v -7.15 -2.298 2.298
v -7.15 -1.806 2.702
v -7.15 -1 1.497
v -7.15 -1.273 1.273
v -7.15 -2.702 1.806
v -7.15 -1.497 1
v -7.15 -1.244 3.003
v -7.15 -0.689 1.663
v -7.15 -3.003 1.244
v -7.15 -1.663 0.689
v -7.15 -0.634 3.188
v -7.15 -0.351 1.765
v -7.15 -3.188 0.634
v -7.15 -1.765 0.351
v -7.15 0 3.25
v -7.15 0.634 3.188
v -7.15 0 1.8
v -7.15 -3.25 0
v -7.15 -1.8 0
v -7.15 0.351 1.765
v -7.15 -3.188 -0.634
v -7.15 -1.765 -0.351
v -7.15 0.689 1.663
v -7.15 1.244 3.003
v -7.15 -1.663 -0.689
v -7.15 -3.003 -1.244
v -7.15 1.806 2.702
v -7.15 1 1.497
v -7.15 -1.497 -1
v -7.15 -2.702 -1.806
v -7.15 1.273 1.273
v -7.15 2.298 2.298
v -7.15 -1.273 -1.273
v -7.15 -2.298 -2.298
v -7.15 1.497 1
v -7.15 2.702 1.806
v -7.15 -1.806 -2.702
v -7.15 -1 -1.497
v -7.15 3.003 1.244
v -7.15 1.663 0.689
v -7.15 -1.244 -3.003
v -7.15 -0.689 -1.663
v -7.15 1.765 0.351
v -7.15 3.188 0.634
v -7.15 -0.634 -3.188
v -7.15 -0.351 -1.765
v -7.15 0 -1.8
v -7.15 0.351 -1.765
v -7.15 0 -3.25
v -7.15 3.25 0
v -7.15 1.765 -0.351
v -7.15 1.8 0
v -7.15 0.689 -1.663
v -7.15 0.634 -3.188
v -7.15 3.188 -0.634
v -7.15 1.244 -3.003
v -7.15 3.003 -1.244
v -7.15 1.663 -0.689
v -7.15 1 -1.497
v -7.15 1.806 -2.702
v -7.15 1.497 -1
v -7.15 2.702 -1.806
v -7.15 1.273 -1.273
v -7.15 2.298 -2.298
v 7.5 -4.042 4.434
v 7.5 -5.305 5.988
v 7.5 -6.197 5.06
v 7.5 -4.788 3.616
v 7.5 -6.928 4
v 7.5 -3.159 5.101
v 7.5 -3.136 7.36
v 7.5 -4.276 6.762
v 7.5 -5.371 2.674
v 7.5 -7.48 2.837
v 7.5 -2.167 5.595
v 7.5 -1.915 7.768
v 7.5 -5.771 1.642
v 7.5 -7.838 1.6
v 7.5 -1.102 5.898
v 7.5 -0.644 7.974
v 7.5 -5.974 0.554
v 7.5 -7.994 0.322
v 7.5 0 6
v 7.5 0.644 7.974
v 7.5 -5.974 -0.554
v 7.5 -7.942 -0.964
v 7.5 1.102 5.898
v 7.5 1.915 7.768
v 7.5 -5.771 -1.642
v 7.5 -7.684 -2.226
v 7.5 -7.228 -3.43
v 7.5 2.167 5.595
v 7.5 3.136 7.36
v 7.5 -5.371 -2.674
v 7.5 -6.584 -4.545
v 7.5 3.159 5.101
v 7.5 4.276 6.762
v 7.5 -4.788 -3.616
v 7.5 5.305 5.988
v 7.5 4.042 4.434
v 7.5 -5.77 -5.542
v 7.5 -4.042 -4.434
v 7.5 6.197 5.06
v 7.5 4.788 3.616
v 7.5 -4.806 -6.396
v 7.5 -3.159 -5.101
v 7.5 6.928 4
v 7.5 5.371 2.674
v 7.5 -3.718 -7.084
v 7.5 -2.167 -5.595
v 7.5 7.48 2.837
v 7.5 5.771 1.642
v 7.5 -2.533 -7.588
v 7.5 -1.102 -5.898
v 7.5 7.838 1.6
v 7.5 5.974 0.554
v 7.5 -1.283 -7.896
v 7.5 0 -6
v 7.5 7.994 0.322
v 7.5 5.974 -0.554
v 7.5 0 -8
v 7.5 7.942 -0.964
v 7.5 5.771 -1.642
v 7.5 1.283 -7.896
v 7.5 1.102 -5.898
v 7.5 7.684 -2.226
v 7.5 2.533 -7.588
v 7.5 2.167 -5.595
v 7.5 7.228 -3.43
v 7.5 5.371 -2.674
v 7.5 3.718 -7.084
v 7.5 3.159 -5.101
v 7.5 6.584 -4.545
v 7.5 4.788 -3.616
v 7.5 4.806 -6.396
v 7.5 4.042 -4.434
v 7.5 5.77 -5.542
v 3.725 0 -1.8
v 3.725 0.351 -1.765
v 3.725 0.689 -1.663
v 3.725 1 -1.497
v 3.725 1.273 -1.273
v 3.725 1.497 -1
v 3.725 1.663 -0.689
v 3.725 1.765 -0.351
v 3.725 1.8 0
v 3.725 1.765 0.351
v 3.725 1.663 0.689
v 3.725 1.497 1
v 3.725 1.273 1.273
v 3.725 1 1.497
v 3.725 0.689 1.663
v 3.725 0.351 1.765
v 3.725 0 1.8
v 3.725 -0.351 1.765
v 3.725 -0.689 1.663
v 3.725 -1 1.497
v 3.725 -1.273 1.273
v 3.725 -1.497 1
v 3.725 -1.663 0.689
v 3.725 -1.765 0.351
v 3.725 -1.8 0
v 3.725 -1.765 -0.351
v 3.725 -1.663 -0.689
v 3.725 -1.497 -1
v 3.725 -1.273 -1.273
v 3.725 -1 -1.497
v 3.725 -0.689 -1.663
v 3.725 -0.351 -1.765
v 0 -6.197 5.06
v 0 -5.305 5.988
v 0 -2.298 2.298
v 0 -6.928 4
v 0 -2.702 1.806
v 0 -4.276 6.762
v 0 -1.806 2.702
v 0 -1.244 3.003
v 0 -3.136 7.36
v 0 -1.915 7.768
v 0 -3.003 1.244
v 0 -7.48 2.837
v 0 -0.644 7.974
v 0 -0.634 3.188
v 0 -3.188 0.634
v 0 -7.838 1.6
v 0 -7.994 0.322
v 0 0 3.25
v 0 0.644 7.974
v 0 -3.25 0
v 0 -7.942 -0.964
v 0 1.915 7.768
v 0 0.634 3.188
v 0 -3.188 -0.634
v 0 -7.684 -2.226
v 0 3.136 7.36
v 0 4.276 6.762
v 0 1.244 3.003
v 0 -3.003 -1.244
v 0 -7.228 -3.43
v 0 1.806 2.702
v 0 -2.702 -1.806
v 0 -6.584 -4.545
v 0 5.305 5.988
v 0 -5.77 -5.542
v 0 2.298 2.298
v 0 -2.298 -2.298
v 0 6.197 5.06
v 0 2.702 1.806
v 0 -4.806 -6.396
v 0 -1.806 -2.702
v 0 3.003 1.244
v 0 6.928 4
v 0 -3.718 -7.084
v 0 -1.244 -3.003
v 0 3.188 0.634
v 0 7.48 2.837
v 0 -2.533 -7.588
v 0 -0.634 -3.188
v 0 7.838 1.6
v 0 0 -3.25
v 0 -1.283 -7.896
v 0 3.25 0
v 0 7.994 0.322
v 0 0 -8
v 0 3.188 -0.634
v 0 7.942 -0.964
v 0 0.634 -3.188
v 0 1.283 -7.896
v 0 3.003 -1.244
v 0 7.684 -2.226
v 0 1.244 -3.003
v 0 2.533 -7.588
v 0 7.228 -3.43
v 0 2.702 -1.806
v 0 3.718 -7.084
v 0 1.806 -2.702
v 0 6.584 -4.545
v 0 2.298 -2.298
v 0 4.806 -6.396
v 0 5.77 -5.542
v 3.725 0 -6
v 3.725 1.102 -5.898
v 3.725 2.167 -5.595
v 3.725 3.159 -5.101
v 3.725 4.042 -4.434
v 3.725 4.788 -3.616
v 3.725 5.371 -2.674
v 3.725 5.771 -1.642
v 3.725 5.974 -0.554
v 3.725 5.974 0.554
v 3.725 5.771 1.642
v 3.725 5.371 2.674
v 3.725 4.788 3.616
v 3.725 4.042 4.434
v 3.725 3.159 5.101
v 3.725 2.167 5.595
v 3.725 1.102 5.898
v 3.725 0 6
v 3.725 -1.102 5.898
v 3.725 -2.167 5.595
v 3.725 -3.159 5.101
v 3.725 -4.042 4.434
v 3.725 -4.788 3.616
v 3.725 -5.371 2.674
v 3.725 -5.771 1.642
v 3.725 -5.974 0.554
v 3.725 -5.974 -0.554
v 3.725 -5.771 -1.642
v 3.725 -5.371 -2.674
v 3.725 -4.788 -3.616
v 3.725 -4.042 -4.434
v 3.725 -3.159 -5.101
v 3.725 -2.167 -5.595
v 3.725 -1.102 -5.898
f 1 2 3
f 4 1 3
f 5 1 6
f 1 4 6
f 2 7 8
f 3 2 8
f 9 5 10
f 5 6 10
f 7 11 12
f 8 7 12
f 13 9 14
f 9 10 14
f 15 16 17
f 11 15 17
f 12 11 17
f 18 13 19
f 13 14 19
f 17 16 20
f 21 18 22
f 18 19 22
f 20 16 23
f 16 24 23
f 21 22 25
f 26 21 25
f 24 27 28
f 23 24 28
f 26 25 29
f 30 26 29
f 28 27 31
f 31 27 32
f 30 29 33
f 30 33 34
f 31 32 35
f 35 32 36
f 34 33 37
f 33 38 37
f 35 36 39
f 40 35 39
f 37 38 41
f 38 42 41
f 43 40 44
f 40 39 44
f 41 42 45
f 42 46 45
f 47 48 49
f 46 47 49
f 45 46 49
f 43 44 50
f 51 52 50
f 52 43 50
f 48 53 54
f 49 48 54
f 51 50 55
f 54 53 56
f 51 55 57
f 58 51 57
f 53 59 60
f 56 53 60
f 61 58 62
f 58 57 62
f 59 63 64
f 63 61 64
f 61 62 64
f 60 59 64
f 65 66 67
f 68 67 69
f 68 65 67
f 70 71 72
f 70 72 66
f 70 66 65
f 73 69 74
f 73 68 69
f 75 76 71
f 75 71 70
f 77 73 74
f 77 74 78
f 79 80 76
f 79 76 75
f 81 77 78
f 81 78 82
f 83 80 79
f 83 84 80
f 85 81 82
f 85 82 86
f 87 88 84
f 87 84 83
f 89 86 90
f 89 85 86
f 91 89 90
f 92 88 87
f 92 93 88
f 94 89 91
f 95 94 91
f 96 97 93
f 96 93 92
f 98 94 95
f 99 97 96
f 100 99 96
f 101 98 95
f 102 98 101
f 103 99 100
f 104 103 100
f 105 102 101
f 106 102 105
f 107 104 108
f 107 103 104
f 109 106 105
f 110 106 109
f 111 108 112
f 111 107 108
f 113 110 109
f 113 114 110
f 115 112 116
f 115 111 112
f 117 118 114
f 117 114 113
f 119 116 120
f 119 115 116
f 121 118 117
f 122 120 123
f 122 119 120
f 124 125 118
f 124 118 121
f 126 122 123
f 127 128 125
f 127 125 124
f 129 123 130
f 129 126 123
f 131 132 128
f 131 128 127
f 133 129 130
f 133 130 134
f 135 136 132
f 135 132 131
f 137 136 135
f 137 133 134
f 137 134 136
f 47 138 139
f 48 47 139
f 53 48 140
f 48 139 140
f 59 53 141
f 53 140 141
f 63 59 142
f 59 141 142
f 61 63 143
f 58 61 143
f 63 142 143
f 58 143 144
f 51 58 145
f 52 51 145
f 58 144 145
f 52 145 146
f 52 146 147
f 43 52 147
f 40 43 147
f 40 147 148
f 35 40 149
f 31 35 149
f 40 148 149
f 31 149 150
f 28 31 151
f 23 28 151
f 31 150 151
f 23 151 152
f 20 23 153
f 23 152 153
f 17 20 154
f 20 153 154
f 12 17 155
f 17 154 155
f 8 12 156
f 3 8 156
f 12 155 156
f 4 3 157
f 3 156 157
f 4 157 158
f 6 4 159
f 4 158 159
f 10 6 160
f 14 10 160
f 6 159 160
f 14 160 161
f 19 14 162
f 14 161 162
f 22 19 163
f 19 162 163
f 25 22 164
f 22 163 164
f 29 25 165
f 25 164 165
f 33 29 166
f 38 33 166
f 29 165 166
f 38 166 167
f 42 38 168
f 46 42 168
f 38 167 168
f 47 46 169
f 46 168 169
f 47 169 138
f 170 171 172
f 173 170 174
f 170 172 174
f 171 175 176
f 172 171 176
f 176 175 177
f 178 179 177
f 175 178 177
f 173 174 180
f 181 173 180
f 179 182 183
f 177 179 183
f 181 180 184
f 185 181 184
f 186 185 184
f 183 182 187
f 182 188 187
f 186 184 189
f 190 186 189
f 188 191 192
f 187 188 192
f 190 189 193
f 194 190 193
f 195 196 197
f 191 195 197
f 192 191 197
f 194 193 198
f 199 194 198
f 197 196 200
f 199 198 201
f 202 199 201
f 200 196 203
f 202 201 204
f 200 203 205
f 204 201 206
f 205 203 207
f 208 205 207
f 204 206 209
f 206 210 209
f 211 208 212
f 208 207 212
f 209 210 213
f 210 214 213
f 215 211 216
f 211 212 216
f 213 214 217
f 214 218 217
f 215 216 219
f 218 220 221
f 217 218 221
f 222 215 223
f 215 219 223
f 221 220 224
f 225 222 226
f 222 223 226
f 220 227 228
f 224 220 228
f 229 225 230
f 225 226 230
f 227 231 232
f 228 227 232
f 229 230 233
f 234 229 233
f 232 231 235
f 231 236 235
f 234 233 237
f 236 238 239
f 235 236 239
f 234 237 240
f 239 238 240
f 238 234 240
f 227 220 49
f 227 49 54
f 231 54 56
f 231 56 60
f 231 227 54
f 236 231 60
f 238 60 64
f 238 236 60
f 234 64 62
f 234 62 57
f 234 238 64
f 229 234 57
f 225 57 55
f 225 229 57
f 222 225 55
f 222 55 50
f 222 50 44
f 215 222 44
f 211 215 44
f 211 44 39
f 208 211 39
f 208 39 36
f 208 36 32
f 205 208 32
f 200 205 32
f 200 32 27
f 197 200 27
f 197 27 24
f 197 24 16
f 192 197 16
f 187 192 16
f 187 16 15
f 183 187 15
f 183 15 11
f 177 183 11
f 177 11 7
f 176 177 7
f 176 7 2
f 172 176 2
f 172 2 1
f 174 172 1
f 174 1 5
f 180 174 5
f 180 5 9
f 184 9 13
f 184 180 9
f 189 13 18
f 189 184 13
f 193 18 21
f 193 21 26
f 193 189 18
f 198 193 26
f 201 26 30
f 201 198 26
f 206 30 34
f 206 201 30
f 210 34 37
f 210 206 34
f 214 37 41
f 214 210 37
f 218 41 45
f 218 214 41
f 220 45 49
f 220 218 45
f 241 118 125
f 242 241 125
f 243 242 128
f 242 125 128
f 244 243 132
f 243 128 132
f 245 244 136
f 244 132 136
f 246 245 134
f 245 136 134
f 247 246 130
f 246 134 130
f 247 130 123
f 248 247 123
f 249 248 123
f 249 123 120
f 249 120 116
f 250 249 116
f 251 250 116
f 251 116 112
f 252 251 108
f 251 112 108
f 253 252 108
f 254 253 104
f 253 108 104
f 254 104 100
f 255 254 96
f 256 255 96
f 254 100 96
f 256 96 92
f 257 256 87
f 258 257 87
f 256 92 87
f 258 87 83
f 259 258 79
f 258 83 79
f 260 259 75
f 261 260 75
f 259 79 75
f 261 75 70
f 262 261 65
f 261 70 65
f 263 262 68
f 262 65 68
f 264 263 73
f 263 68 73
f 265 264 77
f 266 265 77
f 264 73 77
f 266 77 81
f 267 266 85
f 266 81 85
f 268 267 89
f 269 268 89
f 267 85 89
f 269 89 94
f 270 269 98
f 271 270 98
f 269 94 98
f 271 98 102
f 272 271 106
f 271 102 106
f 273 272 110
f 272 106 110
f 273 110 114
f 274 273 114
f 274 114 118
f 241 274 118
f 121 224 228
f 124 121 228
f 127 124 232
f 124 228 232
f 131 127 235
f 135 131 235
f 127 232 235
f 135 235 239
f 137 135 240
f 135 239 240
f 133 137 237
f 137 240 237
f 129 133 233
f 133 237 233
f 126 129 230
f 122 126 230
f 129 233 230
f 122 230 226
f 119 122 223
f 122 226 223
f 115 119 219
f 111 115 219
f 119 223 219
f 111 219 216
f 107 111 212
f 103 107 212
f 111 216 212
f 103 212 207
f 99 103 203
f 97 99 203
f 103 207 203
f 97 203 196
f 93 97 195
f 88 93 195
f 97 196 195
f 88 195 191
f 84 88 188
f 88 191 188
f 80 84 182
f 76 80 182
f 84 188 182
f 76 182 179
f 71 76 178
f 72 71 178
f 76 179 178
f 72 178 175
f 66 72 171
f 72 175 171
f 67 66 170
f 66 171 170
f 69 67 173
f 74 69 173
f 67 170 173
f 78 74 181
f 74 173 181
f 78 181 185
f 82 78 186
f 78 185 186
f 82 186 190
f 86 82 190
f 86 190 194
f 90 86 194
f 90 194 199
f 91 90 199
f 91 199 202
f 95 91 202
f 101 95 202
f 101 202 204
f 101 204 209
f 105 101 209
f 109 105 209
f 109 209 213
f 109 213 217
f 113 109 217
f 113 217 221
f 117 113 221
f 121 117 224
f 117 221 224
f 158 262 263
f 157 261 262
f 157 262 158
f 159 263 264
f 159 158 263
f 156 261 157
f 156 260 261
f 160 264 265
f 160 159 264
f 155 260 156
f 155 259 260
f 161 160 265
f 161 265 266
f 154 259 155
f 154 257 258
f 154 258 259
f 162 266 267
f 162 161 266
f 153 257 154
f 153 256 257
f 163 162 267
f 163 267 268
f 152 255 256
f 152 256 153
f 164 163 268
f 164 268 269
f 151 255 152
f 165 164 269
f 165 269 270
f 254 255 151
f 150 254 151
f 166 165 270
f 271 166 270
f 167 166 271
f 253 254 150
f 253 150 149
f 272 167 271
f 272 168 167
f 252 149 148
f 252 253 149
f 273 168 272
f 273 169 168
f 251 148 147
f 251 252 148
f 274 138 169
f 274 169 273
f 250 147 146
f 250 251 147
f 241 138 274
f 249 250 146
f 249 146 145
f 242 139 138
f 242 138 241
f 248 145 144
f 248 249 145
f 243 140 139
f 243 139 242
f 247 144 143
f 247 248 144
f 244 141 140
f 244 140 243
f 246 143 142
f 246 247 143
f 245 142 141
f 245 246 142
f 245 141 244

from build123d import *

# Parameters (mm, degrees)
SKETCH2_R           = 8
SKETCH2_R_2         = 3.25
BOSS_EXTRUDE1_DEPTH = 7.5
SKETCH3_R           = 6
CUT_EXTRUDE1_DEPTH  = 3.775
SKETCH4_R           = 3.25
SKETCH4_R_2         = 1.8
BOSS_EXTRUDE2_DEPTH = 10.875


with BuildPart() as part:
    # Sketch2 → Boss-Extrude1 (new body)
    with BuildSketch(Plane(origin=(0, 0, 0), x_dir=(0, 0, -1), z_dir=(1, 0, 0))):
        Circle(SKETCH2_R)
        Circle(SKETCH2_R_2, mode=Mode.SUBTRACT)
    extrude(amount=BOSS_EXTRUDE1_DEPTH)

    # Sketch3 → Cut-Extrude1 (cut)
    with BuildSketch(Plane(origin=(7.5, 0, 0), x_dir=(0, 0, -1), z_dir=(1, 0, 0))):
        Circle(SKETCH3_R)
    extrude(amount=-CUT_EXTRUDE1_DEPTH, mode=Mode.SUBTRACT)

    # Sketch4 → Boss-Extrude2 (add)
    with BuildSketch(Plane(origin=(3.725, 0, 0), x_dir=(0, 0, -1), z_dir=(1, 0, 0))):
        Circle(SKETCH4_R)
        Circle(SKETCH4_R_2, mode=Mode.SUBTRACT)
    extrude(amount=-BOSS_EXTRUDE2_DEPTH)


solid = part.part
